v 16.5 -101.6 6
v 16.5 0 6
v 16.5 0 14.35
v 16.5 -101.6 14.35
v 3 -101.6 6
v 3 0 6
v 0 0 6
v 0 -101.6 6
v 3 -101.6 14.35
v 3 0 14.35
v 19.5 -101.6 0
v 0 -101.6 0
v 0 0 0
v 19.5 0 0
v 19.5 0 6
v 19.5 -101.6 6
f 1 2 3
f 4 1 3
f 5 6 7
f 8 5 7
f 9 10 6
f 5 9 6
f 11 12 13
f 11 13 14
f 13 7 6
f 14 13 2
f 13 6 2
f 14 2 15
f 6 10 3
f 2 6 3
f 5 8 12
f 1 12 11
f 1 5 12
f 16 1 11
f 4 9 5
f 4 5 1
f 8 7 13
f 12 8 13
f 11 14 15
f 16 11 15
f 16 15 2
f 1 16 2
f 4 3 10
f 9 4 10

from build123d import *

# Parameters (mm, degrees)
F1_DEPTH = 101.6


with BuildPart() as f1:
    # F0 (on Front) → F1 (new body)
    with BuildSketch(Plane.XZ):
        Polygon((0, 6), (0, 0), (19.5, 0), (19.5, 6), (16.5, 6), (16.5, 1.62), (3, 1.62), (3, 6), align=None)
        Polygon((3, 14.35), (3, 6), (3, 1.62), (16.5, 1.62), (16.5, 6), (16.5, 14.35), align=None)
    extrude(amount=F1_DEPTH)


solid = f1.part
